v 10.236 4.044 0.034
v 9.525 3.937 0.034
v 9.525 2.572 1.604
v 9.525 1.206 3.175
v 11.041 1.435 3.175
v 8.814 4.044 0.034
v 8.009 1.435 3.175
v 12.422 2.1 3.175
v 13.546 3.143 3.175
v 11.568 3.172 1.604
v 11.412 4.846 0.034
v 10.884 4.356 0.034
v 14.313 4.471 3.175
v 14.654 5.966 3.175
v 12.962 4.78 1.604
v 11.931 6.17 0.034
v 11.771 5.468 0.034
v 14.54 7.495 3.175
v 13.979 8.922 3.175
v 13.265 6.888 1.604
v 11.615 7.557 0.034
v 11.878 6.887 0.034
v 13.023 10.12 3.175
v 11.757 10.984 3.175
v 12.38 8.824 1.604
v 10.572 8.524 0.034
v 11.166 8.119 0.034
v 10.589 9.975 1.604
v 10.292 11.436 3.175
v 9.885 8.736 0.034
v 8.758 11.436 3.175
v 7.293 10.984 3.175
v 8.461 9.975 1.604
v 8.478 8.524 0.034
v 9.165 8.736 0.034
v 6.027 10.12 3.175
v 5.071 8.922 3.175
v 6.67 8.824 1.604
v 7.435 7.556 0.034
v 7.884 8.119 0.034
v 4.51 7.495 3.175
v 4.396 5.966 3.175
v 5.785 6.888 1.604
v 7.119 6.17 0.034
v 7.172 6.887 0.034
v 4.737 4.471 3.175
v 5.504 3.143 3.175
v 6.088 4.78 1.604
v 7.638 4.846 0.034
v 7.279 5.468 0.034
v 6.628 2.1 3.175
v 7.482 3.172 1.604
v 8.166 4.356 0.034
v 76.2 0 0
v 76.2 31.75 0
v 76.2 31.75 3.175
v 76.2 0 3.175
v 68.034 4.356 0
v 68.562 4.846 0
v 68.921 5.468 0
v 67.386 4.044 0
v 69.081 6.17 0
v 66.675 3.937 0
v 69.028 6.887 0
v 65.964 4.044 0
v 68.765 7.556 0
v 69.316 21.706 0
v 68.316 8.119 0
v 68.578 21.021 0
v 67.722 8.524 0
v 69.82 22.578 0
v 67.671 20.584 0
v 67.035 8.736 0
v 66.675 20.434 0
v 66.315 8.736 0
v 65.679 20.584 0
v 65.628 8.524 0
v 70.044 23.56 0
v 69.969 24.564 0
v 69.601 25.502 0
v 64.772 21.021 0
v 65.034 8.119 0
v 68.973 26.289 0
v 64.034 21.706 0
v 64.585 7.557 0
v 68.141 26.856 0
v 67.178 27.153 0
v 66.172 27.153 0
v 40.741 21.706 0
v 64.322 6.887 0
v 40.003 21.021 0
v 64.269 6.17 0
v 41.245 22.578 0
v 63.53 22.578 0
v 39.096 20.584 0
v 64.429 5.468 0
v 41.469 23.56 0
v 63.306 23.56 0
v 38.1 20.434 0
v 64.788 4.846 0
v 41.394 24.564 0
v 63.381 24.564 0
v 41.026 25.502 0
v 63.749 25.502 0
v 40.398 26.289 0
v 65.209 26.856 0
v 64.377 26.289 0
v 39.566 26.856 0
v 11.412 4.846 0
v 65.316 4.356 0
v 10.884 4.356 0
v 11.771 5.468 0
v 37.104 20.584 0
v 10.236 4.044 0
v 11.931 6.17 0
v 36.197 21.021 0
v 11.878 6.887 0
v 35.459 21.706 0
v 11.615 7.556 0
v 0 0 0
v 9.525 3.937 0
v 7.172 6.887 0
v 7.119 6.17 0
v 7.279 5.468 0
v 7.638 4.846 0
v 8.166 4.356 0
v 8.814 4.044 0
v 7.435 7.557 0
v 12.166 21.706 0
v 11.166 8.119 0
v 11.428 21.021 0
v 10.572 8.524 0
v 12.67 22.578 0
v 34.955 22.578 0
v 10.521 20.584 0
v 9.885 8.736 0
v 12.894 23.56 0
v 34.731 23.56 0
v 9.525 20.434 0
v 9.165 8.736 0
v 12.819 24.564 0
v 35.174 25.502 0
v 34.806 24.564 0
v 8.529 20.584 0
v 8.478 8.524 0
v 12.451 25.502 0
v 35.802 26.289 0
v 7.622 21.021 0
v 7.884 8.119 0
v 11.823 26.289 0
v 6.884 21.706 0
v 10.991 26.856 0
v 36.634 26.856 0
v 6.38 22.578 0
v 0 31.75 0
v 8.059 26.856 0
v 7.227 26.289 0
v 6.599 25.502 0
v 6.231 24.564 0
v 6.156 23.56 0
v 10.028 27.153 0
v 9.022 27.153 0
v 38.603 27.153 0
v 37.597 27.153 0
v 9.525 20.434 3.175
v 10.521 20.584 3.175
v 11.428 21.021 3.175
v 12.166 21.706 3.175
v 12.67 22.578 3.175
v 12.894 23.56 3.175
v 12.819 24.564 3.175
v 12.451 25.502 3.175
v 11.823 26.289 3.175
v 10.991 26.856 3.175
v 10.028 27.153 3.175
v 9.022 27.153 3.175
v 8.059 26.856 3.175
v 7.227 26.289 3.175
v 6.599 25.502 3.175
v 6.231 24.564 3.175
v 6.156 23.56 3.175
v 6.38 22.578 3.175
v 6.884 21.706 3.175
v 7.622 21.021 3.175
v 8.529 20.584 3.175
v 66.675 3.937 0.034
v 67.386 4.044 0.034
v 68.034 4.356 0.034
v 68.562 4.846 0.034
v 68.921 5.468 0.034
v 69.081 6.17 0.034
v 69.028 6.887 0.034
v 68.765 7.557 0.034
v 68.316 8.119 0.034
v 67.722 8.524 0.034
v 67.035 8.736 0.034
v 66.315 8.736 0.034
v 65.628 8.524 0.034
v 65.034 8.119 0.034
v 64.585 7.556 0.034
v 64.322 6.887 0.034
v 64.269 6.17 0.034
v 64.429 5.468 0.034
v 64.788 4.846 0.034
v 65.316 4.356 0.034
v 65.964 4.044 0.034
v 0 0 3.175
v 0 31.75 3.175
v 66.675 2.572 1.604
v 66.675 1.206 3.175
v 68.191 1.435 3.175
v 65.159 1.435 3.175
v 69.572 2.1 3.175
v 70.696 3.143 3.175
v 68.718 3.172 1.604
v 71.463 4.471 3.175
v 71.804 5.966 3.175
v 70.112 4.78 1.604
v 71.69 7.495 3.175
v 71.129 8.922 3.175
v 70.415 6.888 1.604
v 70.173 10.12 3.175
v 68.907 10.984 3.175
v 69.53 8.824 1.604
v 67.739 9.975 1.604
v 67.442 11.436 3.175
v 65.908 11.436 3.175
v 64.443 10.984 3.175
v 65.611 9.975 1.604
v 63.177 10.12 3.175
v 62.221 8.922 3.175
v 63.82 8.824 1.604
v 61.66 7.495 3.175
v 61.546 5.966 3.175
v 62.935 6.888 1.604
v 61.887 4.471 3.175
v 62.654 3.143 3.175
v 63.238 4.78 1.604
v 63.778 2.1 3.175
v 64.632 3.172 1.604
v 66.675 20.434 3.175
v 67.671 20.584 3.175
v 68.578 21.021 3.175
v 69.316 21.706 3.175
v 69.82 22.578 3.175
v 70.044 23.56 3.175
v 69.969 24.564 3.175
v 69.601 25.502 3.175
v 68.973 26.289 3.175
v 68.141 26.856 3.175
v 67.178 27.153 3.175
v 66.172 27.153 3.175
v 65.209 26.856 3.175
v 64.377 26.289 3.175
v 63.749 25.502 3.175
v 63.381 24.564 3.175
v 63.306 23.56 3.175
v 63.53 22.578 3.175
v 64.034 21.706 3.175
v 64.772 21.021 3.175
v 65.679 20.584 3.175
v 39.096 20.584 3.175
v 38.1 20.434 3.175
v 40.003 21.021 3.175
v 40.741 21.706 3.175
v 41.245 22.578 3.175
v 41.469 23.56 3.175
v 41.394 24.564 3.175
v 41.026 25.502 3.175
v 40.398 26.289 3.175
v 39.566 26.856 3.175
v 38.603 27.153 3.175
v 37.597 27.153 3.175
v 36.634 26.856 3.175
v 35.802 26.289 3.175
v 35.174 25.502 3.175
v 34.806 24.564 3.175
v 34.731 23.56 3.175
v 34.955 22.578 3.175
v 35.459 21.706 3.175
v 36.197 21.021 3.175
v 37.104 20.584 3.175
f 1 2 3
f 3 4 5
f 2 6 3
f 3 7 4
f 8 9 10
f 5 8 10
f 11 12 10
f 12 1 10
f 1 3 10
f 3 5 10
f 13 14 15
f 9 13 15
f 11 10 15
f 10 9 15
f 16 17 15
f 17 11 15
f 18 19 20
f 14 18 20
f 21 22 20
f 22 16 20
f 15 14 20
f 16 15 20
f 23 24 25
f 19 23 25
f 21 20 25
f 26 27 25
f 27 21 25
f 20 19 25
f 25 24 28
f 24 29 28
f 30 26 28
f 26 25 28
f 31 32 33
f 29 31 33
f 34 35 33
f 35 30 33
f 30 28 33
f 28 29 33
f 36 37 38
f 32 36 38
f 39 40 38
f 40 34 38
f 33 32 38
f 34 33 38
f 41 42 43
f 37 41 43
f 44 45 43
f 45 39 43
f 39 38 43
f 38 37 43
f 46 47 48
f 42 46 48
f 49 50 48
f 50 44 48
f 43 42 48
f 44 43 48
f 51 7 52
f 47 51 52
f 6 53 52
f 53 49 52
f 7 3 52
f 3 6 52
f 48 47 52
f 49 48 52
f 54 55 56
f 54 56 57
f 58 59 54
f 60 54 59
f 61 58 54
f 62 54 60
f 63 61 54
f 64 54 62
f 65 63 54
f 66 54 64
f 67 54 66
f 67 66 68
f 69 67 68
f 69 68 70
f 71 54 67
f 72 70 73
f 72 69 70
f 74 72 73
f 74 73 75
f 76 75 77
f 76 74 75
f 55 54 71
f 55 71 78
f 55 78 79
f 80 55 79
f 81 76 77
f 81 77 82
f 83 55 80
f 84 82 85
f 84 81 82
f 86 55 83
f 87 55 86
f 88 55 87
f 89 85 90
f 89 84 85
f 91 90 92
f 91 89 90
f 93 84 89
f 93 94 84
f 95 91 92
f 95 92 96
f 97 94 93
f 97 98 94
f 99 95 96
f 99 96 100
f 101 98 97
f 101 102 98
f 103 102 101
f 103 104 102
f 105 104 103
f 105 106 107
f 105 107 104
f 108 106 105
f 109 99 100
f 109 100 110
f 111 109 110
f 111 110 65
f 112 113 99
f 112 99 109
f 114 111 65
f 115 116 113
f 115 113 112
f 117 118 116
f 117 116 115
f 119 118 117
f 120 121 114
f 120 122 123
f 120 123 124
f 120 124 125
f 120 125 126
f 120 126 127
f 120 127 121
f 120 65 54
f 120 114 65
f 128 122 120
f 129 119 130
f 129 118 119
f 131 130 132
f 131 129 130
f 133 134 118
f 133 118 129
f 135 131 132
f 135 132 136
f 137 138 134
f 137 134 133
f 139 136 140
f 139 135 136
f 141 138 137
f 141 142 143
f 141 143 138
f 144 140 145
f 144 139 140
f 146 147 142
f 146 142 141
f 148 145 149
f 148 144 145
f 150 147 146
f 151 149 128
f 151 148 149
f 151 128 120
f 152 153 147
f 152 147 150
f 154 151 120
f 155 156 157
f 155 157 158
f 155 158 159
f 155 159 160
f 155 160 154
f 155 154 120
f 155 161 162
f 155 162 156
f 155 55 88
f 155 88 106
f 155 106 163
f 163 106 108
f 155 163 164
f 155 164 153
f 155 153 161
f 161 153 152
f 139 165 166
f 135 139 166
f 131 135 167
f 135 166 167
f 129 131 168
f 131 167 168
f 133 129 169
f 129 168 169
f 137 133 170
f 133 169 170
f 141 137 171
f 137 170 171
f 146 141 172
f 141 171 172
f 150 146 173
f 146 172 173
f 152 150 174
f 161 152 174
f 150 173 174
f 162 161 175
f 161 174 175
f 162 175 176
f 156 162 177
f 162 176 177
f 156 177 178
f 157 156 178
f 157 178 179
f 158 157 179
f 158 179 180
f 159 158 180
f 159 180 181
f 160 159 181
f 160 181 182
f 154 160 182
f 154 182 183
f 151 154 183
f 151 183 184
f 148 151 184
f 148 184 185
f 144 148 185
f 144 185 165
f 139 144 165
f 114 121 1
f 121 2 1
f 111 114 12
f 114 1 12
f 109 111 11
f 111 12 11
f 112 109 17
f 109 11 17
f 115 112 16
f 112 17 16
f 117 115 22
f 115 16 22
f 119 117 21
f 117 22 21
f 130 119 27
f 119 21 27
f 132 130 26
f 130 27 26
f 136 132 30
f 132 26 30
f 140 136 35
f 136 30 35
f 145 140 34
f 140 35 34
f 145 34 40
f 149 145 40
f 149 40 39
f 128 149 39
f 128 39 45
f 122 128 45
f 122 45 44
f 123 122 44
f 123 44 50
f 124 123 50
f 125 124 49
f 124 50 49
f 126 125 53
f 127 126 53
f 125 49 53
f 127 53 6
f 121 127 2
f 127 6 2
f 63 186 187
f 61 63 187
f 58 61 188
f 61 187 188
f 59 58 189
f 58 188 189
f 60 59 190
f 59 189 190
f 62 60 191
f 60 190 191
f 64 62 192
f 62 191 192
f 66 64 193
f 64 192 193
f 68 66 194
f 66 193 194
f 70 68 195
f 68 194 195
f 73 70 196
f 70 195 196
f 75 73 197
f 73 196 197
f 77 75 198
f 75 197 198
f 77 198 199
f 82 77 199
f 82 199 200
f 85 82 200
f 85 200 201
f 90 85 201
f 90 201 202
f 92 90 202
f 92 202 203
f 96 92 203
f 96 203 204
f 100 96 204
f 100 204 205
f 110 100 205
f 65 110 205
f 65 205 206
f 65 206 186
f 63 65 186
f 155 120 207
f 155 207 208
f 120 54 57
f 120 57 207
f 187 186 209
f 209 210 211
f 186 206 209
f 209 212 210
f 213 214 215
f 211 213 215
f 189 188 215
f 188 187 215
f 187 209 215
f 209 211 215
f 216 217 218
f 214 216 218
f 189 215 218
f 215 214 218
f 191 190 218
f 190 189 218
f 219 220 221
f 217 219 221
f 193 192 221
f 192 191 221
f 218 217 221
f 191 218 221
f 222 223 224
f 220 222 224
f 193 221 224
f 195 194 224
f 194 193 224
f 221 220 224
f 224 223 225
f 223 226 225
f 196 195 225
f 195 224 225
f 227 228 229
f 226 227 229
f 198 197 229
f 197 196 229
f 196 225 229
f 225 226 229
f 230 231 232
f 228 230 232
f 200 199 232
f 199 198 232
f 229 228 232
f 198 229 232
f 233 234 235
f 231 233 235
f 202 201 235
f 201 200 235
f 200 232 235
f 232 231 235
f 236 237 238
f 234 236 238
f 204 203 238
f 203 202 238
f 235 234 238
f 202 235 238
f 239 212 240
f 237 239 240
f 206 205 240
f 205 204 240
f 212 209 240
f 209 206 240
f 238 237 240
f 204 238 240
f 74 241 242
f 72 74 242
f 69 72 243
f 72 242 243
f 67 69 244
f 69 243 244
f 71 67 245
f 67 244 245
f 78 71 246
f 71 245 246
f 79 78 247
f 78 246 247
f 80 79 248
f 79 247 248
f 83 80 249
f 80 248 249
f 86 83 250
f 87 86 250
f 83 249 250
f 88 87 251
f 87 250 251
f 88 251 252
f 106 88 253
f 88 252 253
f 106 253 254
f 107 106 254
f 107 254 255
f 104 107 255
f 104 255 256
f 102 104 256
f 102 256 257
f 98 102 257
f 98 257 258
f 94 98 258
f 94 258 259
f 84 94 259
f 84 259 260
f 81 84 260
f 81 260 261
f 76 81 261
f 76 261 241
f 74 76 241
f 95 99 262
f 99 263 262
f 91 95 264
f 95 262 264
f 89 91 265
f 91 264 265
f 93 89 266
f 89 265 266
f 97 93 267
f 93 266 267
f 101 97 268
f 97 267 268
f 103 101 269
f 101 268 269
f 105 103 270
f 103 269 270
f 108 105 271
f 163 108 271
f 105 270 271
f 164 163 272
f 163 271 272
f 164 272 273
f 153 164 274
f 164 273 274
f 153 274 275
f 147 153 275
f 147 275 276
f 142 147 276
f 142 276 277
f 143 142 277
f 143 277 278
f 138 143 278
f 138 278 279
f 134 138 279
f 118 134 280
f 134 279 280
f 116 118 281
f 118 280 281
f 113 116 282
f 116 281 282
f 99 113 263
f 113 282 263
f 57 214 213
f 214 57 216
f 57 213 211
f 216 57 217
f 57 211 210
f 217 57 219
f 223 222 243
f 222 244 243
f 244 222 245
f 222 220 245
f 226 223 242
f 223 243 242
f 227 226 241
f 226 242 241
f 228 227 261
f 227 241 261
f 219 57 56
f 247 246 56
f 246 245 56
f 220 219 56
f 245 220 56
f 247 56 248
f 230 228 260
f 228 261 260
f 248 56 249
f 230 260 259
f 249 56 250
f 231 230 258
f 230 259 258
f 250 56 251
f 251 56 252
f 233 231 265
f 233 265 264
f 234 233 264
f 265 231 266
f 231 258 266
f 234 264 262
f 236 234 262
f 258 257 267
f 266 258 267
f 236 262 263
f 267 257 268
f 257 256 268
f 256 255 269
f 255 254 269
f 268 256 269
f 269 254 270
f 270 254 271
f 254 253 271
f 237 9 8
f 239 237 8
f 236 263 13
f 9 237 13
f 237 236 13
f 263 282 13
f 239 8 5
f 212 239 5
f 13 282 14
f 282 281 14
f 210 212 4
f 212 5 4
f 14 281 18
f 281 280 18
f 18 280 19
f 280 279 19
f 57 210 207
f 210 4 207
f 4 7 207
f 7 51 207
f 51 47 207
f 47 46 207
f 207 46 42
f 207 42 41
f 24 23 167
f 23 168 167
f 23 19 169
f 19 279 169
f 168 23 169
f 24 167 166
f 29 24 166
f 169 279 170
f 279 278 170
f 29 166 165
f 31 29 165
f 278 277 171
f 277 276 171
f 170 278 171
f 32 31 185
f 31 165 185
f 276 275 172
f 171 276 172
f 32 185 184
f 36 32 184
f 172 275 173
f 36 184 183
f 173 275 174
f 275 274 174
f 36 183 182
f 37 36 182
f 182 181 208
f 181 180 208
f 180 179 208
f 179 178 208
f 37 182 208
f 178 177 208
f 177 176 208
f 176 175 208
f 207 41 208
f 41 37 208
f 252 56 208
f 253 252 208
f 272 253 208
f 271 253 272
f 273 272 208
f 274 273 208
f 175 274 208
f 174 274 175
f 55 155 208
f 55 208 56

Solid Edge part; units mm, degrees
sketch "Sketch1" plane through (0, 0, 0) normal (0, 0, 1) x (1, 0, 0)
  line L0 (0, 0) -> (0, 31.75)
  line L1 (0, 31.75) -> (76.2, 31.75)
  line L2 (76.2, 31.75) -> (76.2, 0)
  line L3 (76.2, 0) -> (0, 0)
  dimension "D1" = 76.2
  dimension "D2" = 31.75
extrude "Protrusion1" add sketch "Sketch1" along normal blind 3.175
hole "Hole_1" at (38.1, 23.8125, 3.175) direction (0, 0, -1) diameter 6.7564 end up to next
hole "Hole1" at (66.675, 23.8125, 3.175) direction (0, 0, -1) diameter 6.7564 end up to next
hole "Hole2" at (9.525, 23.8125, 3.175) direction (0, 0, -1) diameter 6.7564 end up to next
hole "Hole3" at (66.675, 6.35, 3.175) direction (0, 0, -1) diameter 4.826 end up to next countersink diameter 10.287 countersink angle 82
hole "Hole4" at (9.525, 6.35, 3.175) direction (0, 0, -1) diameter 4.826 end up to next countersink diameter 10.287 countersink angle 82
